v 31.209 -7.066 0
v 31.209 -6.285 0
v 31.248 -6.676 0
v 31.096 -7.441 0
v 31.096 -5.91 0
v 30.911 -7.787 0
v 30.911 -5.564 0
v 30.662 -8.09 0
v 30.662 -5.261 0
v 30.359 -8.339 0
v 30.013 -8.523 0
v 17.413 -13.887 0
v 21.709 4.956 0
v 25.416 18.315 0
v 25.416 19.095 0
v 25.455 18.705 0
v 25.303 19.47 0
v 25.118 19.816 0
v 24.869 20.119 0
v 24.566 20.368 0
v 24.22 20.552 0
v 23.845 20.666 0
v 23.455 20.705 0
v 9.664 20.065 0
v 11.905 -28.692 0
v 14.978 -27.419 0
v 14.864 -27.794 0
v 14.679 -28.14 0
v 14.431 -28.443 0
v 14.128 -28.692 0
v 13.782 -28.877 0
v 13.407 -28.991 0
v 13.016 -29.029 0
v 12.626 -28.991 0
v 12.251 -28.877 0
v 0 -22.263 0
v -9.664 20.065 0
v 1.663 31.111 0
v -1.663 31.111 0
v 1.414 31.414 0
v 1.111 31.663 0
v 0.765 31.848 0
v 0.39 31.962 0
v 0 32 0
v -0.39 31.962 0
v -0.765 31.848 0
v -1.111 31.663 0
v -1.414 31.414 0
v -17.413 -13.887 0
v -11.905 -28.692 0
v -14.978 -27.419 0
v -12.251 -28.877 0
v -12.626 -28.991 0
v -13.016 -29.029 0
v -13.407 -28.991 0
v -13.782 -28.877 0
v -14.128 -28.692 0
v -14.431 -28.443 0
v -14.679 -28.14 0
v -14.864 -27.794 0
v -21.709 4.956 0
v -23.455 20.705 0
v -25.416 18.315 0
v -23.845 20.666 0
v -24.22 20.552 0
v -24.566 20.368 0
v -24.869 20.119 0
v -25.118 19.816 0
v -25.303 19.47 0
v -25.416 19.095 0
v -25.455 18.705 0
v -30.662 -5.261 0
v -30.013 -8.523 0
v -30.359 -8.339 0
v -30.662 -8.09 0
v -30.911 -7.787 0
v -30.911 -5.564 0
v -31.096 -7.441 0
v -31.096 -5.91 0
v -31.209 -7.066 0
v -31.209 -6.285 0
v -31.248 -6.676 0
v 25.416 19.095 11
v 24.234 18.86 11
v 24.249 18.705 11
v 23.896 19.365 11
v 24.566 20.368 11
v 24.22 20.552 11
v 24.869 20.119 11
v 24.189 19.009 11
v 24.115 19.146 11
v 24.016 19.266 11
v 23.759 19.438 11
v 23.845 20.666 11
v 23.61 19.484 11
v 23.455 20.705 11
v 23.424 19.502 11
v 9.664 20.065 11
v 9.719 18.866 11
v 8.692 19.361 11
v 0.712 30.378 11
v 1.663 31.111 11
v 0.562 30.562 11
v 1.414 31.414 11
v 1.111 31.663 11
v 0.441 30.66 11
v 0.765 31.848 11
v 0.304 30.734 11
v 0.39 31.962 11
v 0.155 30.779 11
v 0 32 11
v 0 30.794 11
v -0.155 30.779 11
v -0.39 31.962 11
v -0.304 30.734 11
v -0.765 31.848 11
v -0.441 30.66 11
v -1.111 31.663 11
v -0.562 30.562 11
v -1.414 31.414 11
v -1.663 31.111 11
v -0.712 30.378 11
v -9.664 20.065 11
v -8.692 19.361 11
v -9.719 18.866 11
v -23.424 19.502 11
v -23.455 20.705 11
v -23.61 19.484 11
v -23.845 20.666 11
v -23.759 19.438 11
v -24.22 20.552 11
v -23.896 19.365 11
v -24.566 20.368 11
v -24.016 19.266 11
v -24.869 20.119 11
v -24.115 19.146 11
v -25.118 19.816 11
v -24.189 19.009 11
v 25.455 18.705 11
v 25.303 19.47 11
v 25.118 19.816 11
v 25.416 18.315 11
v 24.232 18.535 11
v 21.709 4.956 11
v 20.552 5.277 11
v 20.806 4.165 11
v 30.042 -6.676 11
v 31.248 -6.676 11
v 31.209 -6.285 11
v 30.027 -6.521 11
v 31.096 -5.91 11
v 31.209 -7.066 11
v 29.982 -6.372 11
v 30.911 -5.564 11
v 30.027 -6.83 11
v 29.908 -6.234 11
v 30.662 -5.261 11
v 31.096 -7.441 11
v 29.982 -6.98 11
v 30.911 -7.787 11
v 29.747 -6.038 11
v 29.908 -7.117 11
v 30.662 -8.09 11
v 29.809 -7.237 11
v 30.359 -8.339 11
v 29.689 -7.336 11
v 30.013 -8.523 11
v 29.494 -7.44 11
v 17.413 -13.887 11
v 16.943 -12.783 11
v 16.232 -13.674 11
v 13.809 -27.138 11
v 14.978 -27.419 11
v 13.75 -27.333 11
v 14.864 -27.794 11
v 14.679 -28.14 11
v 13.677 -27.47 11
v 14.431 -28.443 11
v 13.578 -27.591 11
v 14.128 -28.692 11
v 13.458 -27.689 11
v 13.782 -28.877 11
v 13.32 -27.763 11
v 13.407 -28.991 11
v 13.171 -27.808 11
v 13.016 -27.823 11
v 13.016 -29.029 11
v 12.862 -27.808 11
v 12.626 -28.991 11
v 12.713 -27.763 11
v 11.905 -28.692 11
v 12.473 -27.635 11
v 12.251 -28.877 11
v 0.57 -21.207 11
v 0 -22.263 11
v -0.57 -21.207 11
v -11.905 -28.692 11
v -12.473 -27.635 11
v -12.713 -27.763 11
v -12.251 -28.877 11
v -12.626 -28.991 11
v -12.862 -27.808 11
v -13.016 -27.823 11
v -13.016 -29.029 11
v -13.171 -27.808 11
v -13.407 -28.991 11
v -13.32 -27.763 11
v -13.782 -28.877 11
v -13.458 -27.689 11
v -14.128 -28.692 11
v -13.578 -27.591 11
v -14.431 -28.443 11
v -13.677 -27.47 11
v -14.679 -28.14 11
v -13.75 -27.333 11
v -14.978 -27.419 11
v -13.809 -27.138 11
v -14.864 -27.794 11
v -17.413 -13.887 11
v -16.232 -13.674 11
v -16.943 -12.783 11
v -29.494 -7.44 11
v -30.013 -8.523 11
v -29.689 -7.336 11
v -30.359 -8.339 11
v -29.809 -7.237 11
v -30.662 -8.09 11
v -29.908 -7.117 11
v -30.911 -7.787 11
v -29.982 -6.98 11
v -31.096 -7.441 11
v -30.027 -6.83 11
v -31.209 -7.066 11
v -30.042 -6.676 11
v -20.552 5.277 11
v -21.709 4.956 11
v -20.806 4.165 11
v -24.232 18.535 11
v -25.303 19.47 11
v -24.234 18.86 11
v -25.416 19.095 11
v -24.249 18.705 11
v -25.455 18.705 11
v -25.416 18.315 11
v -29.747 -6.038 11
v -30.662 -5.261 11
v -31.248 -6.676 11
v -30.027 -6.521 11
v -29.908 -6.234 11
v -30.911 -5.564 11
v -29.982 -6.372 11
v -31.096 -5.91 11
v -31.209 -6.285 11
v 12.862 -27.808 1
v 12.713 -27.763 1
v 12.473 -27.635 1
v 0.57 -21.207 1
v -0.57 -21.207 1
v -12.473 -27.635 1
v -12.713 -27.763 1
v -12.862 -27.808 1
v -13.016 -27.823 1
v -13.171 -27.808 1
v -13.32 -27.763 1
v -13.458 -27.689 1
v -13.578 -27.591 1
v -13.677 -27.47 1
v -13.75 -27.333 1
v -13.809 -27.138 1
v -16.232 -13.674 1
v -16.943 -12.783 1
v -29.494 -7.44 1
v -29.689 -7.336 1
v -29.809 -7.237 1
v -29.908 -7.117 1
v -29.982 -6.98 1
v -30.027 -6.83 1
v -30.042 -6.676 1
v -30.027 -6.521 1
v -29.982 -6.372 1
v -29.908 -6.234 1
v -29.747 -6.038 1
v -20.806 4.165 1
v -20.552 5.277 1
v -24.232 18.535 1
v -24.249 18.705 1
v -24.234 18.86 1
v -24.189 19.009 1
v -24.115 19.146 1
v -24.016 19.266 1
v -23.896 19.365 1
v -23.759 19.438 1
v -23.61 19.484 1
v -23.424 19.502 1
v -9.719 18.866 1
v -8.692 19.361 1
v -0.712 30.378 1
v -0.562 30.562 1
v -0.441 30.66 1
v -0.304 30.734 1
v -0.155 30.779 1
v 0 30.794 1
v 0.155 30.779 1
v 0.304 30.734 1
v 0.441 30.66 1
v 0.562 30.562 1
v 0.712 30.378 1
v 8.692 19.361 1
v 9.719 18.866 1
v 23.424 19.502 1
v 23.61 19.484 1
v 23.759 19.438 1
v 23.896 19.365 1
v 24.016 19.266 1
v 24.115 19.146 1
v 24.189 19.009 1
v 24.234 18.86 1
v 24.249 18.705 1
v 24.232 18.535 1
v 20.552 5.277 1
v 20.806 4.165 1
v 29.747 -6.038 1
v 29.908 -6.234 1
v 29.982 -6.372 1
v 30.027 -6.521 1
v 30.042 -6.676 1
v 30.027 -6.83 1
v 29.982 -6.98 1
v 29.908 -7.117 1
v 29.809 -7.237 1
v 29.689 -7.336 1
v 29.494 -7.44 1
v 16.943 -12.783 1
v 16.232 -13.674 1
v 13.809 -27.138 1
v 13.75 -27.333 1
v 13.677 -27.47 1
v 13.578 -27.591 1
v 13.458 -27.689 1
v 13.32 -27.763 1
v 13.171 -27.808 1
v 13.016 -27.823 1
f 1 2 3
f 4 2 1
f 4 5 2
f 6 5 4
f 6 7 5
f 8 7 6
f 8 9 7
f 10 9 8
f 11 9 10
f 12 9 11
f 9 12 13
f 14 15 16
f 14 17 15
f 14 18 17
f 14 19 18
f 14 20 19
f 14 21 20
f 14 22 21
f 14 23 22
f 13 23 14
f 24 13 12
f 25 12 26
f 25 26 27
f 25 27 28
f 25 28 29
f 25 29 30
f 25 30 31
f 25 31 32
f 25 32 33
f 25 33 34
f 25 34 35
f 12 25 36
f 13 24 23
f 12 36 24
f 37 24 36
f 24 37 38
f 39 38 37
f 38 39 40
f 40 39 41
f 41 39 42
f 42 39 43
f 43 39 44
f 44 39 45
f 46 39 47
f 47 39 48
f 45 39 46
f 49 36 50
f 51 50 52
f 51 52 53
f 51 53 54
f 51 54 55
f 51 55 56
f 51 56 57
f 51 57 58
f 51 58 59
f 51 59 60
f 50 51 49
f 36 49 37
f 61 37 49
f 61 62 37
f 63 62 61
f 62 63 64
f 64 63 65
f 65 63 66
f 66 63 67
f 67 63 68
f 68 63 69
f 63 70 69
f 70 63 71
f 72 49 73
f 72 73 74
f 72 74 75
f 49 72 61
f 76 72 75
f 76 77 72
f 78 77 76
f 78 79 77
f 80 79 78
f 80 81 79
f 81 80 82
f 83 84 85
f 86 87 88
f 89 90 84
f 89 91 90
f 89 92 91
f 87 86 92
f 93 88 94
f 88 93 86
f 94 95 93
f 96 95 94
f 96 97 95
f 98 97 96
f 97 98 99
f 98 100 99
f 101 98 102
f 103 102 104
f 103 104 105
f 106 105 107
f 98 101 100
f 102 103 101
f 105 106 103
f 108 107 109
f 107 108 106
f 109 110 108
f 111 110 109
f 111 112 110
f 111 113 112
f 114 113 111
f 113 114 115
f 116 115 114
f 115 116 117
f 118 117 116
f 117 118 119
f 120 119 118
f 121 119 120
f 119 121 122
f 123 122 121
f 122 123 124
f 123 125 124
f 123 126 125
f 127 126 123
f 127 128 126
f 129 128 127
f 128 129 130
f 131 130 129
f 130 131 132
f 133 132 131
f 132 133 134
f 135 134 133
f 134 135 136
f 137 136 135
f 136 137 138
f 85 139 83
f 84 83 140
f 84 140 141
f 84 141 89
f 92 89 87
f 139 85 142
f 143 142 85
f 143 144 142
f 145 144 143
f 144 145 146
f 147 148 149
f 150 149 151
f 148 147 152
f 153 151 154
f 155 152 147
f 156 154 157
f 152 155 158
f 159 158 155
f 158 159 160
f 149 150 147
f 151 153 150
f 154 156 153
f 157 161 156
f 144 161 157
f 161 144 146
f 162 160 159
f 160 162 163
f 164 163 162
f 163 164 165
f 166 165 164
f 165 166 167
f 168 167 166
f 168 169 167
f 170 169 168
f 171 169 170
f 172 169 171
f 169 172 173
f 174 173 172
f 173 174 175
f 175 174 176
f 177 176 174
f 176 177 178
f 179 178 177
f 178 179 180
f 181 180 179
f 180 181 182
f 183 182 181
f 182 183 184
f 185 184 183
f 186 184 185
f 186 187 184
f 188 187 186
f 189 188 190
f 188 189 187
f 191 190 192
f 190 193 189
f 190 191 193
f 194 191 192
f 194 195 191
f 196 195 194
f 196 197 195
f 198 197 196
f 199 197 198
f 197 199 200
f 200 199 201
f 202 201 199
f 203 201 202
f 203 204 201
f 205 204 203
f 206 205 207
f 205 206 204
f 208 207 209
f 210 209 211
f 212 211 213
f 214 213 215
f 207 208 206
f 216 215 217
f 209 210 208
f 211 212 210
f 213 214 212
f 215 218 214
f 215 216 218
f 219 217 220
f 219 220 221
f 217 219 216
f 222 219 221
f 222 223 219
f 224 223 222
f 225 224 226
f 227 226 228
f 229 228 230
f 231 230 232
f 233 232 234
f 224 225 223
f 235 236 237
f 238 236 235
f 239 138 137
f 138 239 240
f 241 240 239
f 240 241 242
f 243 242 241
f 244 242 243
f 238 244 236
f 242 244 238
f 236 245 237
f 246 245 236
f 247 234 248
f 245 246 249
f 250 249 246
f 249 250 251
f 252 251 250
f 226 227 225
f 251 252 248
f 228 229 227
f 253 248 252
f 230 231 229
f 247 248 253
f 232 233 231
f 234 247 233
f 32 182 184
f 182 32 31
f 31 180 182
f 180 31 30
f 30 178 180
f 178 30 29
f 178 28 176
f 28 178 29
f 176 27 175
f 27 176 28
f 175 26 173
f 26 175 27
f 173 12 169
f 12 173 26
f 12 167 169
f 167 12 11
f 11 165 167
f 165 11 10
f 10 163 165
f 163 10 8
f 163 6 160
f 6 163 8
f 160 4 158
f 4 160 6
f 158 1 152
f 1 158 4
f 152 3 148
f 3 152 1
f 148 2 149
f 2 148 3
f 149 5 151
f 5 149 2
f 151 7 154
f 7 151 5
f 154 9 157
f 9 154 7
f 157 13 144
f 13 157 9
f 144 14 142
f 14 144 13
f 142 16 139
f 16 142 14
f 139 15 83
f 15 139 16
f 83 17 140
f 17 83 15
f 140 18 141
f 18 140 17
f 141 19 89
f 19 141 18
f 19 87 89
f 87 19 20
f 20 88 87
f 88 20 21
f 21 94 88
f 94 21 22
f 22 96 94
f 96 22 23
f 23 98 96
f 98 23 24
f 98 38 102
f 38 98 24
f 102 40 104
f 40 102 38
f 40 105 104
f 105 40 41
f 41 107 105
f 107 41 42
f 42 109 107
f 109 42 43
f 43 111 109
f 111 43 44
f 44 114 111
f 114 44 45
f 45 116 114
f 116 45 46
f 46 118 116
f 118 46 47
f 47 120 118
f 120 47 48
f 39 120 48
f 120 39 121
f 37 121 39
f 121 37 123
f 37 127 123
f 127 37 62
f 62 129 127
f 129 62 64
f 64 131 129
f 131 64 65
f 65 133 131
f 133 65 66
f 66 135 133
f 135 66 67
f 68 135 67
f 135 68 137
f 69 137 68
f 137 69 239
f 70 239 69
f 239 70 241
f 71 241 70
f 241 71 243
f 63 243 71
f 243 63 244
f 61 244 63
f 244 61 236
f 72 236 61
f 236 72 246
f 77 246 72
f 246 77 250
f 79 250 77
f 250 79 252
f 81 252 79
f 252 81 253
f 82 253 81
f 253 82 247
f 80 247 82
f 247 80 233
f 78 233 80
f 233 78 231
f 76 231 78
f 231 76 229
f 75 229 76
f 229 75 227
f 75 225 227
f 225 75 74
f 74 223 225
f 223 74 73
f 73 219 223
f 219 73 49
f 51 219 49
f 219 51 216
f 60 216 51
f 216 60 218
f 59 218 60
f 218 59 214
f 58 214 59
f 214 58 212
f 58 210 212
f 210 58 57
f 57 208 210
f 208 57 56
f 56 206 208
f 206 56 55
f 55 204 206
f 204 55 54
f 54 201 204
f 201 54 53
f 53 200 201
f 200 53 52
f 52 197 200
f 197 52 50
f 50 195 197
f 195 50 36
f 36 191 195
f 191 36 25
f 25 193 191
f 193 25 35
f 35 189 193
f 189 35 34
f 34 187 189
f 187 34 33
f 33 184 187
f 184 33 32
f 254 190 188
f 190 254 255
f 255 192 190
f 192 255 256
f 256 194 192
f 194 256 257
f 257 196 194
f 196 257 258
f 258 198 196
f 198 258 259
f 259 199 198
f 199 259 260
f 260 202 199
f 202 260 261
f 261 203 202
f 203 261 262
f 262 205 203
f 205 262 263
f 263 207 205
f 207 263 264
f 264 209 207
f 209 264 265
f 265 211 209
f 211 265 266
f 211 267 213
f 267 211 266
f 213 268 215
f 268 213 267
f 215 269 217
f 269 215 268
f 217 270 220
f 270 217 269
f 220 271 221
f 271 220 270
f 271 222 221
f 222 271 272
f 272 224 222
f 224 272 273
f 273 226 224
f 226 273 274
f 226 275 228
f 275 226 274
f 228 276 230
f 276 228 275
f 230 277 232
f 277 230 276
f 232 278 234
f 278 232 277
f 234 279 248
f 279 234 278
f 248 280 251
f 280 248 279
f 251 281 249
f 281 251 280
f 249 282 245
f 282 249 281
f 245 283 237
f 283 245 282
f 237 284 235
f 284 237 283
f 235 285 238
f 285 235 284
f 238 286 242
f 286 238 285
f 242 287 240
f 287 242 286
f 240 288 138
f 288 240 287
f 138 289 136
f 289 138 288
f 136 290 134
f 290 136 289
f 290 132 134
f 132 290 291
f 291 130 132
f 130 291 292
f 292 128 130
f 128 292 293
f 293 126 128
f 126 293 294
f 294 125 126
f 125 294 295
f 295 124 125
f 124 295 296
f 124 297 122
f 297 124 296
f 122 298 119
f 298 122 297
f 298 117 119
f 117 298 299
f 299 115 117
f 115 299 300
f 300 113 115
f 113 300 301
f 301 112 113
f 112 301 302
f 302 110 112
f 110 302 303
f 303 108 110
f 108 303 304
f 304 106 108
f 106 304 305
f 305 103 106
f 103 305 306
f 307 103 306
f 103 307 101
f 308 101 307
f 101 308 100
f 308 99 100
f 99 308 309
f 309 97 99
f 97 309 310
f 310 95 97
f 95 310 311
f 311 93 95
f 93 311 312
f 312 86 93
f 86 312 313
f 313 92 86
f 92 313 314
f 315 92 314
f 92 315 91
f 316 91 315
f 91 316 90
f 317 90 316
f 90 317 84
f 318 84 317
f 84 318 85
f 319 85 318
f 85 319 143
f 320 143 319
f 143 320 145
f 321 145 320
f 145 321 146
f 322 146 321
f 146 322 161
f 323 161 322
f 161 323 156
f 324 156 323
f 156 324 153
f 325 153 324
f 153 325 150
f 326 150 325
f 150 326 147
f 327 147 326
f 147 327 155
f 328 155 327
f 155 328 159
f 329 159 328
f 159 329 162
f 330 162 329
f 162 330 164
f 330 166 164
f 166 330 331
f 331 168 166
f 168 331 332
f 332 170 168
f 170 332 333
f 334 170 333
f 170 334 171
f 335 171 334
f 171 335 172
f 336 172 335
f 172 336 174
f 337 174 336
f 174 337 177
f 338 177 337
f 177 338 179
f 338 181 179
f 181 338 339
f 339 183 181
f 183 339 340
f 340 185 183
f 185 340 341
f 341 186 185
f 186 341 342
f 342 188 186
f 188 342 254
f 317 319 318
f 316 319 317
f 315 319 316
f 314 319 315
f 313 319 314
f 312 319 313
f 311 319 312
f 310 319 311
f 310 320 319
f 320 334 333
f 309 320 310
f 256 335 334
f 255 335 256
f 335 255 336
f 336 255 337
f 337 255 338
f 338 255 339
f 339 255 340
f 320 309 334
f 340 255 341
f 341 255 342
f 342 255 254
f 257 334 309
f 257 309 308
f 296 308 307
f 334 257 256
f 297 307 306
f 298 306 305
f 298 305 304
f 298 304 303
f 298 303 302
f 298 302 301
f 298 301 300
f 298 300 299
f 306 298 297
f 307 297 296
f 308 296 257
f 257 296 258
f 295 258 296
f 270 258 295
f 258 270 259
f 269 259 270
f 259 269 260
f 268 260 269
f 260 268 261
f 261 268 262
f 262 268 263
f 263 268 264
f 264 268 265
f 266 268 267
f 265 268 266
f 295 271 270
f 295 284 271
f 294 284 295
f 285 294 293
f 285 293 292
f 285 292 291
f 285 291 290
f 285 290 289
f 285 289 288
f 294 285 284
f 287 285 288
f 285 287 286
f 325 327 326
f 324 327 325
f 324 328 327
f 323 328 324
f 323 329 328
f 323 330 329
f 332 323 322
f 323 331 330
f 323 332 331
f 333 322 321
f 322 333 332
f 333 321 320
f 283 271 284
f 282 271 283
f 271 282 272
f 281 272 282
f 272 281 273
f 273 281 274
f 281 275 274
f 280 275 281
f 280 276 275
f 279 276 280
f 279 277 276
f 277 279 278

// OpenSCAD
module poly(n_sides, r, l, rnd = 0) {
    r = r - l;
    theta = 360/n_sides;
    //echo(theta);
    pts_1 = [for (i = [0:theta:360]) [r*sin(i),r*cos(i)]];
    //echo(pts_1);
    
    h = r*cos(theta/2);
    s = r*sin(theta/2);
    //echo(h);
    
    pts_2 = [[-s,0],[0,l+(r-h)],[s,0]];
    //echo(pts_2);
    
    if (rnd == 0) {
        union() {
            for (i = [0:360/n_sides:360]) 
                rotate(i)
                union() {
                    rotate([0,0,-theta/2])
                    polygon(pts_1);
                    
                    translate([0,h,0])
                    polygon(pts_2);
                }
        }
    }
    else {
        minkowski(){
            union() {
                for (i = [0:360/n_sides:360]) 
                    rotate(i)
                    union() {
                        rotate([0,0,-theta/2])
                        polygon(pts_1);
                        
                        translate([0,h,0])
                        polygon(pts_2);
                    }
            }
            circle(rnd, $fn = 32);
        }
    }
}

n = 7; // Number of sides
r = 30; // Radius of the box in mm
l = 10; // Length of each arm in mm
h = 15; // Height of the box
w = 1.2; // Wall thickness in mm
b_l = 1; // Thickness of bottom wall in mm
r_f = 2; // Roundness factor

// Build the box
//translate([-1.5*r,0,0])
union() {
    linear_extrude((8*h/10) - b_l)
    difference() {
        poly(n, r, l, r_f);
        offset(-w)
        poly(n, r, l, r_f);
    }
    linear_extrude(b_l)
    poly(n, r, l, r_f);
}

//// Build the lid
////translate([1.5*r,0,0])
//union() {
//    linear_extrude(2*h/10)
//    difference() {
//        offset(-w)
//        poly(n, r, l, r_f);
//        offset(-2*w)
//        poly(n, r, l, r_f);
//    }
//    linear_extrude(h/10)
//    poly(n, r, l, r_f);
//}
